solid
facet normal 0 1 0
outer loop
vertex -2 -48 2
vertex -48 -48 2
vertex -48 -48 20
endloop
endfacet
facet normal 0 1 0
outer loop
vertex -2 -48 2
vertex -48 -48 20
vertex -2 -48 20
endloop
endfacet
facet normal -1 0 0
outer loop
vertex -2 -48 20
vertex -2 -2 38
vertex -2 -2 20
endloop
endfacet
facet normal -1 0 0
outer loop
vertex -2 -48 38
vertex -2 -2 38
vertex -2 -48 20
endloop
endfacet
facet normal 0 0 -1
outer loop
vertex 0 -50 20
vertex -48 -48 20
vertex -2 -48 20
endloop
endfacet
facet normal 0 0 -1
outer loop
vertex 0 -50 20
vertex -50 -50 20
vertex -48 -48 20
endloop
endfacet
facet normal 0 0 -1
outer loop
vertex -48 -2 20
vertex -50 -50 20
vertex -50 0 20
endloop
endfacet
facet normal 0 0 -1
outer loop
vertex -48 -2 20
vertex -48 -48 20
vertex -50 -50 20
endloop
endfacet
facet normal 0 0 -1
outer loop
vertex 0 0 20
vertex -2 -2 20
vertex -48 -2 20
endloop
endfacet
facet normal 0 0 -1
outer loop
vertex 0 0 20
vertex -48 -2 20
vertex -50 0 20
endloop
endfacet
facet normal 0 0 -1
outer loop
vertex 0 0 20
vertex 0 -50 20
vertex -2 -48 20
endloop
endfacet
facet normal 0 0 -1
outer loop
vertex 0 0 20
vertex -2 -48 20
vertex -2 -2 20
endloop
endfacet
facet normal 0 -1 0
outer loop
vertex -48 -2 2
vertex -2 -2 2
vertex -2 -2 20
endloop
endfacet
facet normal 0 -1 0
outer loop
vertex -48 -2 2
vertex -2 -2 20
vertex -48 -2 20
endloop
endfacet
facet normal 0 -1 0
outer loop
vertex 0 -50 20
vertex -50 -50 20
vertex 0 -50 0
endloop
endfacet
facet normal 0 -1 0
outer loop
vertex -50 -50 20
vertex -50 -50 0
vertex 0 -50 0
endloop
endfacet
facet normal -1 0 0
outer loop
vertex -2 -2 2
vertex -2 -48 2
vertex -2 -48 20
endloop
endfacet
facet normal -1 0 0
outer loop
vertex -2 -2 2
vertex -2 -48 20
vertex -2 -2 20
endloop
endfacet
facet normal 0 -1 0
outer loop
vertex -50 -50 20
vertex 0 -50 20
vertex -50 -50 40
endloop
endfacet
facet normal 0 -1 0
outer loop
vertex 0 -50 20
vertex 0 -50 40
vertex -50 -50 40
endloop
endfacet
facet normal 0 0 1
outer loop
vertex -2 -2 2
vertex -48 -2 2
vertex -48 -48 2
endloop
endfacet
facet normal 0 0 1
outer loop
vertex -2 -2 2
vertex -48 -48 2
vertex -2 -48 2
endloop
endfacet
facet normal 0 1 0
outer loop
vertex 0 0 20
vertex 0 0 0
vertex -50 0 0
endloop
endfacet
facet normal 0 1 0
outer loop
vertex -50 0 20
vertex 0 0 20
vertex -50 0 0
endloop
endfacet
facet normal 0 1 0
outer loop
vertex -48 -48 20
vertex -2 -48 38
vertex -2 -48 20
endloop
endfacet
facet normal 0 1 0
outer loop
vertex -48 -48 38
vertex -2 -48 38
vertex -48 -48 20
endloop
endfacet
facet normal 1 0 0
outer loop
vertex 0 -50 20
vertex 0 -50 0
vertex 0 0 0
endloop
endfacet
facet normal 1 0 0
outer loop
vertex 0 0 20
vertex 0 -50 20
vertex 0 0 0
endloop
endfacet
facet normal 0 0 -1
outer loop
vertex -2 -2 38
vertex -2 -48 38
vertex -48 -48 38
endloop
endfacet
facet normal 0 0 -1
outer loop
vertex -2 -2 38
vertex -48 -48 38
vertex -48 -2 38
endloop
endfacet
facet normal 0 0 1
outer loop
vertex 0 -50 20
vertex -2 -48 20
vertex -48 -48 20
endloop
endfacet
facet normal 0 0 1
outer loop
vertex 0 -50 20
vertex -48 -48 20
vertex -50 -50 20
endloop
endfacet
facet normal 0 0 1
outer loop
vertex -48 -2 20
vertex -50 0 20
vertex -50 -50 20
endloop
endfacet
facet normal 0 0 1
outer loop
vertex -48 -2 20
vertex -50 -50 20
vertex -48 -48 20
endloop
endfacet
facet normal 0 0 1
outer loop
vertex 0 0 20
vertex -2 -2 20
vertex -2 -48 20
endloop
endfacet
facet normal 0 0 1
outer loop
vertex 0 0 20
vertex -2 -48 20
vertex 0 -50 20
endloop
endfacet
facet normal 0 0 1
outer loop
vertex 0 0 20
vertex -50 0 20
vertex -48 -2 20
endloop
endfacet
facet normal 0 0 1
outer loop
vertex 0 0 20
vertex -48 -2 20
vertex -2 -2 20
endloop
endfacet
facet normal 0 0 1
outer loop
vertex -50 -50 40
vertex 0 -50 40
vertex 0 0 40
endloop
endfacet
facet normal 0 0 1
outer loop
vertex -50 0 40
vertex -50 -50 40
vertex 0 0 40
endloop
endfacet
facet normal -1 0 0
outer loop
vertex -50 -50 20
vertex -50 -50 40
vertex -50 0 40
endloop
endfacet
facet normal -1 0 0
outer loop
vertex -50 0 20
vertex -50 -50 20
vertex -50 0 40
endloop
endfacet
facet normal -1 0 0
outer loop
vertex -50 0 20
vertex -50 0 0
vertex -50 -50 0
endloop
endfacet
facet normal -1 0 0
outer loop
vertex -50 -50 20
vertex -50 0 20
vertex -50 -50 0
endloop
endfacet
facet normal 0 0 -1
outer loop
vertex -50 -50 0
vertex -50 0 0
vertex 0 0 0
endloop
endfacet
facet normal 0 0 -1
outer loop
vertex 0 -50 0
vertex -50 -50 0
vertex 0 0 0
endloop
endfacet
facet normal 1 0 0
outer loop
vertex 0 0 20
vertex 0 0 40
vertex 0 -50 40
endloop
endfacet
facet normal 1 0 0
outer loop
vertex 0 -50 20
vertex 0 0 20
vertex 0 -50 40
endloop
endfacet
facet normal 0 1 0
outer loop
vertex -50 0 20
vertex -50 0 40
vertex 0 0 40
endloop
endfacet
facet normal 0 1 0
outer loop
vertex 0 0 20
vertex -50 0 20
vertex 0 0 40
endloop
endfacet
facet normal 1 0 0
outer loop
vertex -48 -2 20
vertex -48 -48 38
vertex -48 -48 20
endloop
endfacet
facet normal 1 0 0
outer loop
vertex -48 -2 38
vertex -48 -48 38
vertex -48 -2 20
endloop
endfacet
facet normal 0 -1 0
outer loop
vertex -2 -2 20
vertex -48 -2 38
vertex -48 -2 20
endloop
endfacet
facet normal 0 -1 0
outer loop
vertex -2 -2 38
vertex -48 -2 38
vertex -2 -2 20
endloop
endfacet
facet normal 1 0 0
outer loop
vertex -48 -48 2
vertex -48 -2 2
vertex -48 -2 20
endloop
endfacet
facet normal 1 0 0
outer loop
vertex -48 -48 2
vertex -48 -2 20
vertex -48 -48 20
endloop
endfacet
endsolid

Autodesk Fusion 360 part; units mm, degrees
sketch "Box Width" plane through (0, 0, 0) normal (0, 0, 1) x (1, 0, 0) in component "BoxBottom"
  line L0 (0, 0) -> (-50, 0)
  line L1 (-50, 0) -> (-50, -50)
  line L2 (-50, -50) -> (0, -50)
  line L3 (0, -50) -> (0, 0)
  dimension "d3" = 50
  dimension "d4" = 50
extrude "Extrude1" add sketch "Box Width" along normal blind 20 makes body 1 in component "BoxBottom"
shell "Shell1" thickness 2 removed faces 1 at (-33.3333, -16.6667, 20) on bodies 1 in component "BoxBottom"
sketch "Box Width (2)" plane through (0, 0, 0) normal (0, 0, 1) x (1, 0, 0) in component "BoxTop"
  line L0 (0, 0) -> (-50, 0)
  line L1 (-50, 0) -> (-50, -50)
  line L2 (-50, -50) -> (0, -50)
  line L3 (0, -50) -> (0, 0)
  dimension "d3_1" = 50
  dimension "d4_1" = 50
extrude "Extrude1'" add sketch "Box Width (2)" along normal blind 20 separate body makes body 2 in component "BoxTop"
shell "Shell1'" thickness 2 removed faces 1 at (-33.3333, -16.6667, 20) on bodies 2 in component "BoxTop"
component "BoxBottom" placed x (1, 0, 0) y (0, 1, 0) z (0, 0, 1) at (0, 0, 0)
component "BoxTop" placed x (0, 1, 0) y (1, 0, 0) z (0, 0, -1) at (0, 0, 40)
equation "Boxwidth = 50 mm"
equation "Boxheight = 40 mm"
equation "d3 = Boxwidth"
equation "d4 = Boxwidth"
equation "d5 = Boxheight / 2"
equation "Wallthickness = 2 mm"
equation "d3_1 = Boxwidth"
equation "d4_1 = Boxwidth"
equation "d5_1 = Boxheight / 2"
equation "Wallthickness_1 = 2 mm"
